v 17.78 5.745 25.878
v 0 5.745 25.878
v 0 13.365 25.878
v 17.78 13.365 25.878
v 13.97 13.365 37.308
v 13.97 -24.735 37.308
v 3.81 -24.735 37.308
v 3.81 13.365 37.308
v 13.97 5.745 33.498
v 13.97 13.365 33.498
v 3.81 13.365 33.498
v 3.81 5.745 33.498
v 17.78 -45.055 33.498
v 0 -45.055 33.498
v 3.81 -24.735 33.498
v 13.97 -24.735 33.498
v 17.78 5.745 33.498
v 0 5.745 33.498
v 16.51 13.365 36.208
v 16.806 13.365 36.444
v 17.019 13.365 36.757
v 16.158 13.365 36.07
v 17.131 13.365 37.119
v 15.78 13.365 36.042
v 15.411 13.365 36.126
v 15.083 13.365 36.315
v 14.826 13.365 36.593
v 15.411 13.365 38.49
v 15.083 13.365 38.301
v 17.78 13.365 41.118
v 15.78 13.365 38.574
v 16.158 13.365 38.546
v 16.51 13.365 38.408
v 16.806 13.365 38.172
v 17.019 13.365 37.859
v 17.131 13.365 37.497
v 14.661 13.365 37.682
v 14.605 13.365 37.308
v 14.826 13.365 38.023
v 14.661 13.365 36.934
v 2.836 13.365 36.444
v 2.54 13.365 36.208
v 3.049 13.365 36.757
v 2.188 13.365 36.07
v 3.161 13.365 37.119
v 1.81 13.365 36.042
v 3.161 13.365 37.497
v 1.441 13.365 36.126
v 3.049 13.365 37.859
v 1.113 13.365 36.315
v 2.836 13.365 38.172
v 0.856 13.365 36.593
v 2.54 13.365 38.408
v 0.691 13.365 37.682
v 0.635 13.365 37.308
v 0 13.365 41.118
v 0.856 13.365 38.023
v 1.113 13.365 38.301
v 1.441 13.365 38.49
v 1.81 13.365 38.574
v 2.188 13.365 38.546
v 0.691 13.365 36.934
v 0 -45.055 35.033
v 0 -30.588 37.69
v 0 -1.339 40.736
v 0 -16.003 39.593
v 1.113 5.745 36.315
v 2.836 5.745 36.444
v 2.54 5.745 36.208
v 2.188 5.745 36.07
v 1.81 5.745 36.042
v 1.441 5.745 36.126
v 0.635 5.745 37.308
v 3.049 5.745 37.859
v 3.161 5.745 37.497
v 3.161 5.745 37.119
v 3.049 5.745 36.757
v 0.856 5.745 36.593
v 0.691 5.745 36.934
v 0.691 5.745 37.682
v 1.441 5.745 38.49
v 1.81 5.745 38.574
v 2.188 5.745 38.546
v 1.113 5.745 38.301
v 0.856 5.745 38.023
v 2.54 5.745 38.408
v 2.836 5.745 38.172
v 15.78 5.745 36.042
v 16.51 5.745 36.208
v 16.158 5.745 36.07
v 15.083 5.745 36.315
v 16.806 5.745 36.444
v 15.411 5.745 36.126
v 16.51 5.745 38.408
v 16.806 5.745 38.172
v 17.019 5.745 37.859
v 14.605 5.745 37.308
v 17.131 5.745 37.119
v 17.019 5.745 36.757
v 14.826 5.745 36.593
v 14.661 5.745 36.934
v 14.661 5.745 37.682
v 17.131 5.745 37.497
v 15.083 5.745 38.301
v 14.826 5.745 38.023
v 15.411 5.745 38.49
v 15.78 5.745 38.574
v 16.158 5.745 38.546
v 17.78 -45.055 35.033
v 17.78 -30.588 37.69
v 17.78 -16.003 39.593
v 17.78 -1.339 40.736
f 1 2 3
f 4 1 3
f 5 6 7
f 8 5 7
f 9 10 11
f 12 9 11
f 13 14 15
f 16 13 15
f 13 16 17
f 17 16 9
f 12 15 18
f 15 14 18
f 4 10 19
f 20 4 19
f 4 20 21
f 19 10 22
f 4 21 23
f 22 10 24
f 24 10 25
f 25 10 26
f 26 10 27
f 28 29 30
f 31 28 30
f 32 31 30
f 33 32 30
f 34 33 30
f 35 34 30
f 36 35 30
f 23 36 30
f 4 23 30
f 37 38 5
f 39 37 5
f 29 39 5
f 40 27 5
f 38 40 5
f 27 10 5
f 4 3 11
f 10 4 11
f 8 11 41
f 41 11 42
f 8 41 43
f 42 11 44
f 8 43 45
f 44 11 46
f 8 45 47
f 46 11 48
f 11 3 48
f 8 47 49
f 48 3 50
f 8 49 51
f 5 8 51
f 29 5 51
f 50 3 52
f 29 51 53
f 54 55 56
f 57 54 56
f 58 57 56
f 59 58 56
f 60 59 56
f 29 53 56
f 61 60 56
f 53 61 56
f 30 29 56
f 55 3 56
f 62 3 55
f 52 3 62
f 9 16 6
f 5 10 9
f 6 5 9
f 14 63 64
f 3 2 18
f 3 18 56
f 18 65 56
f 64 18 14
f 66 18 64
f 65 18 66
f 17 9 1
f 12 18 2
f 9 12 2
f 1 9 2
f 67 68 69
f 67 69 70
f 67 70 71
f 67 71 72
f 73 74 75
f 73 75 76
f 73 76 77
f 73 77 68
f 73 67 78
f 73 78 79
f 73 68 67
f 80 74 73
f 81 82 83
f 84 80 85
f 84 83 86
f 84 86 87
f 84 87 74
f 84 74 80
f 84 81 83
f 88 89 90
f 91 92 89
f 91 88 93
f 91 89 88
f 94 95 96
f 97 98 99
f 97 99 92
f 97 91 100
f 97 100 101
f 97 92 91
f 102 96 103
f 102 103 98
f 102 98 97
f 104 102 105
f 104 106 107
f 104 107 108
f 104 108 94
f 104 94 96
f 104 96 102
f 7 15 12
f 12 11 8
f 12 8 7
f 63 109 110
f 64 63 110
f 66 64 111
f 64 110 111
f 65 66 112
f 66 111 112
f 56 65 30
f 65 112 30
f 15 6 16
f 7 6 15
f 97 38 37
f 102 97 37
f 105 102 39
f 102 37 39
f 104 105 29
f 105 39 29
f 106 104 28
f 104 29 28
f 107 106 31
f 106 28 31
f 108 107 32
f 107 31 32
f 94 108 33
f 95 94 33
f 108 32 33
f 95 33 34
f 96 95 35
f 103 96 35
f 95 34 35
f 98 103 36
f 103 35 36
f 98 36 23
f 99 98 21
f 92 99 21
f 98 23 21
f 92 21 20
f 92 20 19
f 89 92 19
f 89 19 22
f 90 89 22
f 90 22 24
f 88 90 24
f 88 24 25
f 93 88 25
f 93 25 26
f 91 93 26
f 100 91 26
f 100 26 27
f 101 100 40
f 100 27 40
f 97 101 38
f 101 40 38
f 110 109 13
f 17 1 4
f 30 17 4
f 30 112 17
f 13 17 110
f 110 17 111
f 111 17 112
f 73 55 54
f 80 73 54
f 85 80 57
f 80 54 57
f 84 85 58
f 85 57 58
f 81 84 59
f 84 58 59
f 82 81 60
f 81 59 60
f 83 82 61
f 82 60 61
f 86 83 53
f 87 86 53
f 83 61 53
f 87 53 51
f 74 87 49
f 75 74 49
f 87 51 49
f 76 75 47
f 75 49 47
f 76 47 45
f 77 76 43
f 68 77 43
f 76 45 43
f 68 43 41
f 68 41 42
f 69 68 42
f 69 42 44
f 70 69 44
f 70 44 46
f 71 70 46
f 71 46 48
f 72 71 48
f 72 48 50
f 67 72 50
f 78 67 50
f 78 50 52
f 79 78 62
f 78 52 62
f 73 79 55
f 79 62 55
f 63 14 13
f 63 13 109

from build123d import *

# Parameters (mm, degrees)
F0_W     = 50.8
F0_H     = 7.62
F1_DEPTH = 17.78
F3_DEPTH = 25.4
F4_W     = 10.16
F4_H     = 3.81
F5_DEPTH = 38.1
F4_R     = 1.27
F6_DEPTH = 7.62


with BuildPart() as f1:
    # F0 (on Right) → F1 (new body)
    with BuildSketch(Plane.YZ):
        with Locations((-19.6553, 37.308002)):
            Rectangle(F0_W, F0_H)
        Polygon((13.3647, 41.118002), (5.7447, 41.118002), (5.7447, 33.498002), (5.7447, 25.878002), (13.3647, 25.878002), align=None)
    extrude(amount=F1_DEPTH)

    # F2 (on face) → F3 (cut)
    with BuildSketch(Plane.YZ.offset(17.78)):
        with BuildLine():
            ThreePointArc((-45.0553, 35.032712), (-16.00334, 39.592575), (13.3647, 41.118002))
            Line((13.3647, 41.118002), (-45.0553, 41.118002))
            Line((-45.0553, 41.118002), (-45.0553, 35.032712))
        make_face()
    extrude(amount=-F3_DEPTH, mode=Mode.SUBTRACT)

    # F4 (on face) → F5 (cut)
    with BuildSketch(Plane(origin=(0, 13.3647, 0), x_dir=(-1, 0, 0), z_dir=(0, 1, 0))):
        with Locations((-8.89, 35.403002)):
            Rectangle(F4_W, F4_H)
    extrude(amount=-F5_DEPTH, mode=Mode.SUBTRACT)

    # F4 (on face) → F6 (cut)
    with BuildSketch(Plane(origin=(0, 13.3647, 0), x_dir=(-1, 0, 0), z_dir=(0, 1, 0))):
        with Locations((-1.905, 37.308002)):
            Circle(F4_R)
        with Locations((-15.875, 37.308002)):
            Circle(F4_R)
    extrude(amount=-F6_DEPTH, mode=Mode.SUBTRACT)


solid = f1.part
